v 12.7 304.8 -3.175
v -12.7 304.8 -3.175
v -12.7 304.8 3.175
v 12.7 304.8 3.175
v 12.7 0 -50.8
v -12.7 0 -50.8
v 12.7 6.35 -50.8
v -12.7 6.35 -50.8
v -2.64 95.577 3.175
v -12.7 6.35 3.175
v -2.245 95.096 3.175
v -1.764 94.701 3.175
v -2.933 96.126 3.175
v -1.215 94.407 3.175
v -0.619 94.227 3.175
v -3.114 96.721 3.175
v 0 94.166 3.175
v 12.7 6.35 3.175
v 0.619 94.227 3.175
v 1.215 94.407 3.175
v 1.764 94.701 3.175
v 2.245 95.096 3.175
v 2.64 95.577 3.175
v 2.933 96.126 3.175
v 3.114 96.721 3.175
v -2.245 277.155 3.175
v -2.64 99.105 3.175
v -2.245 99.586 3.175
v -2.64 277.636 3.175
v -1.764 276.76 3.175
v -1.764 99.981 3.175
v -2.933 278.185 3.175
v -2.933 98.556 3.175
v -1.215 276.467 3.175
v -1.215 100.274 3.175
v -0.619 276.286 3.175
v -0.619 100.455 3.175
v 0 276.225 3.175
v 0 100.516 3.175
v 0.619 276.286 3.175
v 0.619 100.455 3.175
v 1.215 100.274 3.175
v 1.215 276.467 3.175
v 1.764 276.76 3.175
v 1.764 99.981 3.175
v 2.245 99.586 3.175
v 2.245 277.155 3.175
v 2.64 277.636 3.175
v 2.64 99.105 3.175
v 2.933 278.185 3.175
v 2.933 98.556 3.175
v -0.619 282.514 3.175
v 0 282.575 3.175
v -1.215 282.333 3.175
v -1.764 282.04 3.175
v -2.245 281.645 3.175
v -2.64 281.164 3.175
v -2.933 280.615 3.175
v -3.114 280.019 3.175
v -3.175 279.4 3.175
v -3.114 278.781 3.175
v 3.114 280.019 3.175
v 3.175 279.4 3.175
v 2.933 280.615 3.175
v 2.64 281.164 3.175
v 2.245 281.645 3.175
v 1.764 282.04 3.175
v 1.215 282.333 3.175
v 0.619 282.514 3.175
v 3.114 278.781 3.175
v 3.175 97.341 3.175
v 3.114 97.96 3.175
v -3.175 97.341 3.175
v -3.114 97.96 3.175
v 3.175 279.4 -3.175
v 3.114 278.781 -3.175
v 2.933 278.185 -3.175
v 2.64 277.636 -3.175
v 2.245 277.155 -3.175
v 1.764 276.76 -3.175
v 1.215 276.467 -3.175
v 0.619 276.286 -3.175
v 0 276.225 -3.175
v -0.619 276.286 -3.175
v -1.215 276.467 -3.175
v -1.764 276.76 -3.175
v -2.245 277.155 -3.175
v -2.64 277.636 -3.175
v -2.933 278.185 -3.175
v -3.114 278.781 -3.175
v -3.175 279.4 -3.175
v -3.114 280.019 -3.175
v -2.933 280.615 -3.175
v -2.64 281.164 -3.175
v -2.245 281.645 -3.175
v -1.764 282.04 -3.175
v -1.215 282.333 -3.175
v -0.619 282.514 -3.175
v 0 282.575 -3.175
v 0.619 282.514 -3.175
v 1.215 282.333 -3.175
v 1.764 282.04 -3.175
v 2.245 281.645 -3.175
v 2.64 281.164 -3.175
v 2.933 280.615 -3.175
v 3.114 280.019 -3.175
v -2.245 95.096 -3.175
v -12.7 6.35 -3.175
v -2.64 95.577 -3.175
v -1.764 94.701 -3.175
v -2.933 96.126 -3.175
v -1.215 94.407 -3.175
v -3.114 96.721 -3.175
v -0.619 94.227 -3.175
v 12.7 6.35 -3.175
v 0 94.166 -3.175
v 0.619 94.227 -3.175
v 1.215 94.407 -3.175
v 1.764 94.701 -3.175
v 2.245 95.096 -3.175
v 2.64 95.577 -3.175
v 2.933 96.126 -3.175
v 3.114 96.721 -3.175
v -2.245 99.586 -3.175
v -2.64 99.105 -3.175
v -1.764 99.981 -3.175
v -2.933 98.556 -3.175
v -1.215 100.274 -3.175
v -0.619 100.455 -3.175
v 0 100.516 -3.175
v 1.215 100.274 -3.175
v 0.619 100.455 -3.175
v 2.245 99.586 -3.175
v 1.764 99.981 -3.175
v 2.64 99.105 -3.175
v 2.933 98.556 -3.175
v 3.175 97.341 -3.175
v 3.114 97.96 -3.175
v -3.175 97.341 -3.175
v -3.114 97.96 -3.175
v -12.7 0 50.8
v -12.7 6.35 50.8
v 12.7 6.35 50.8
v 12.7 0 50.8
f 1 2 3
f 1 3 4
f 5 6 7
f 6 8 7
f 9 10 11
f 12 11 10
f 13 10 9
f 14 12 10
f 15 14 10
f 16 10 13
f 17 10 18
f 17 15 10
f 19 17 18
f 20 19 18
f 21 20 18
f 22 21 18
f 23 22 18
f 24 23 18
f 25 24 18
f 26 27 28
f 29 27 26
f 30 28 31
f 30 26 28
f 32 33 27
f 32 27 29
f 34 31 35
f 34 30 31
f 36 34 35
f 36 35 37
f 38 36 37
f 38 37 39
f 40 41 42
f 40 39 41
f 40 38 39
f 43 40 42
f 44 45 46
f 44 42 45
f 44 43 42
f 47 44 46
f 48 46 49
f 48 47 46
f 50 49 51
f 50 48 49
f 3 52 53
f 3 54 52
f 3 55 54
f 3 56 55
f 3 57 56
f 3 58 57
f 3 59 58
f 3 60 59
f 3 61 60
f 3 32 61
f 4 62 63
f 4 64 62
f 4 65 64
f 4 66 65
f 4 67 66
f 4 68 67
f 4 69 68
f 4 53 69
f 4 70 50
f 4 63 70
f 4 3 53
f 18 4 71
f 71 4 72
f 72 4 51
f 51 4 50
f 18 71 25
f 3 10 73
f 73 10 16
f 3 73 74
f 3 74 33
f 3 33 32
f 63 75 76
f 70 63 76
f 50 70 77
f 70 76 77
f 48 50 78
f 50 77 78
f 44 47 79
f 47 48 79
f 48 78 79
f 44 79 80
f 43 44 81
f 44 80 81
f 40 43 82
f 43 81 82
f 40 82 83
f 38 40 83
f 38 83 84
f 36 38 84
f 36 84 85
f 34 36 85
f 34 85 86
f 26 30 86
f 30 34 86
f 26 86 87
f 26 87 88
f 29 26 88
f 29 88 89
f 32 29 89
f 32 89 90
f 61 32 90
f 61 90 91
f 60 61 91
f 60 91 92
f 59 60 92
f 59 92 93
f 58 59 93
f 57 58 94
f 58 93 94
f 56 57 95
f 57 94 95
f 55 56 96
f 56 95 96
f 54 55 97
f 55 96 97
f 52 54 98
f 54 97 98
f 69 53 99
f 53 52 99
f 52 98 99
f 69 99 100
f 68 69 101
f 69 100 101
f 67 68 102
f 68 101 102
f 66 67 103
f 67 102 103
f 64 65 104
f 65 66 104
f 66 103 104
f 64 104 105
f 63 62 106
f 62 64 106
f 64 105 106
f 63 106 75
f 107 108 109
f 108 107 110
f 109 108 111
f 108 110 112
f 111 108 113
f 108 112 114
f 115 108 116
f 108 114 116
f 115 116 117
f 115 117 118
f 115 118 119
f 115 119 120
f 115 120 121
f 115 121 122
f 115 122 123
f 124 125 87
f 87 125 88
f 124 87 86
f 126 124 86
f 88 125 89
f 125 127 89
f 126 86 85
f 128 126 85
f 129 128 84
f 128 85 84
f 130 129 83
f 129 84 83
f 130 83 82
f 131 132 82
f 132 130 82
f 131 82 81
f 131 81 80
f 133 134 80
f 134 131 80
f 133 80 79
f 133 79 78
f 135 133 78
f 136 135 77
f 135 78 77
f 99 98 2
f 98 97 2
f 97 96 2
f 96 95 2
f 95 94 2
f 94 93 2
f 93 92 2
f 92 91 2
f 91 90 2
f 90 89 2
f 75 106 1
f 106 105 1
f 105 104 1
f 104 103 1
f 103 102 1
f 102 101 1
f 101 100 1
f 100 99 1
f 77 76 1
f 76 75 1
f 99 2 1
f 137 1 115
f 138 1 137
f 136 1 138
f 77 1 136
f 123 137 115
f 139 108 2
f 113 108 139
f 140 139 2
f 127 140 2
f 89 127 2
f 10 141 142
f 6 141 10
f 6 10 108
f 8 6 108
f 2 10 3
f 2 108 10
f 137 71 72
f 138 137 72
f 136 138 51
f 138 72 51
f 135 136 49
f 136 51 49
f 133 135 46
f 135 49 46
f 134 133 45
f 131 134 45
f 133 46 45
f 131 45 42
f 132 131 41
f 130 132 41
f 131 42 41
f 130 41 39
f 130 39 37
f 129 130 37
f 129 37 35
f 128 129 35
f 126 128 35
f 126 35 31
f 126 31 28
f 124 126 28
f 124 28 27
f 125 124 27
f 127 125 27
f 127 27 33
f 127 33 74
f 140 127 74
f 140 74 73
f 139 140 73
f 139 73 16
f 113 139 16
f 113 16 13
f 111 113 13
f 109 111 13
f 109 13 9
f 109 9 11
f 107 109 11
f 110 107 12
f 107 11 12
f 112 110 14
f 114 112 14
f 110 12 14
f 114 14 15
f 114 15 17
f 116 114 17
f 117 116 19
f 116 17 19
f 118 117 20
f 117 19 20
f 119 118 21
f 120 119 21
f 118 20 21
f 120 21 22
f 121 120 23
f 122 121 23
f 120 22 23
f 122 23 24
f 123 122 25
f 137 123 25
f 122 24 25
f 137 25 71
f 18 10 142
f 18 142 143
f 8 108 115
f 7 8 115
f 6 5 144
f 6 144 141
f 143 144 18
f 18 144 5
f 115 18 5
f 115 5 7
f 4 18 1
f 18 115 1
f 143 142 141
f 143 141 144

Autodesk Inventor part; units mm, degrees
ref_plane "YZ Plane" through (0, 0, 0) normal (1, 0, 0) x (0, 1, 0)
ref_plane "XZ Plane" through (0, 0, 0) normal (0, 1, 0) x (-1, 0, 0)
ref_plane "XY Plane" through (0, 0, 0) normal (0, 0, 1) x (1, 0, 0)
sketch "Sketch1" plane through (0, 0, 0) normal (0, 0, 1) x (1, 0, 0)
  line L0 (0, 0) -> (12.7, 0)
  line L1 (12.7, 0) -> (12.7, 304.8)
  line L2 (12.7, 304.8) -> (0, 304.8)
  line L3 (0, 304.8) -> (0, 0) construction
  line L4 (0, 0) -> (-12.7, 0)
  line L5 (-12.7, 0) -> (-12.7, 304.8)
  line L6 (-12.7, 304.8) -> (0, 304.8)
  circle A0 centre (0, 279.4) radius 3.175
  dimension "d0" = 304.8
  dimension "d1" = 25.4
  dimension "d2" = 25.4
  dimension "d3" = 6.35
  dimension "d4" = 279.4
extrude "Extrusion1" add sketch "Sketch1" along normal mid plane 6.35
sketch "Sketch2" plane through (0, 0, 0) normal (0, 0, 1) x (1, 0, 0)
  line L0 (-12.7, 0) -> (12.7, 0) projected
  line L1 (-12.7, 0) -> (12.7, 0)
  line L2 (12.7, 0) -> (12.7, 6.35)
  line L3 (12.7, 0) -> (12.7, 304.8) projected
  line L4 (-12.7, 304.8) -> (-12.7, 0) projected
  line L5 (-12.7, 6.35) -> (-12.7, 0)
  line L6 (-12.7, 6.35) -> (12.7, 6.35)
  point P0 (0, 0)
  dimension "d7" = 6.35
extrude "Extrusion2" add sketch "Sketch2" along normal mid plane 101.6
sketch "Sketch3" plane through (0, 0, 3.175) normal (0, 0, 1) x (1, 0, 0)
  circle A0 centre (0, 97.3407) radius 3.175
  line L0 (-12.7, 0) -> (12.7, 0) projected
  point P0 (0, 0)
  dimension "d10" = 97.3407
  dimension "d11" = 6.35
extrude "Extrusion3" cut sketch "Sketch3" against normal through all
equation "\"d0\" = catapultSideHeight"
equation "\"d1\" = catapultSideWidth"
equation "\"d2\" = catapultTopWidth"
equation "\"d3\" = catpultSideHoleDiam"
equation "\"d4\" = catapultSideHoleHeight"
equation "\"d5\" = catapultSideDepth"
equation "\"d7\" = catapultSideDepth"
equation "\"d8\" = catapultSupportWidth"
equation "\"d11\" = catpultSideHoleDiam"
equation "\"catapultSideHeight\" = 304.8"
equation "\"catapultSideWidth\" = 25.4"
equation "\"catapultSideDepth\" = 6.35"
equation "\"catpultSideHoleDiam\" = 6.35"
equation "\"catapultTopWidth\" = 25.4"
equation "\"catapultSupportWidth\" = 101.6"
equation "\"catapultSupportPullyHeight\" = 127"
equation "\"catapultSideHoleHeight\" = 279.4"
properties part number "cPvcSupport"
